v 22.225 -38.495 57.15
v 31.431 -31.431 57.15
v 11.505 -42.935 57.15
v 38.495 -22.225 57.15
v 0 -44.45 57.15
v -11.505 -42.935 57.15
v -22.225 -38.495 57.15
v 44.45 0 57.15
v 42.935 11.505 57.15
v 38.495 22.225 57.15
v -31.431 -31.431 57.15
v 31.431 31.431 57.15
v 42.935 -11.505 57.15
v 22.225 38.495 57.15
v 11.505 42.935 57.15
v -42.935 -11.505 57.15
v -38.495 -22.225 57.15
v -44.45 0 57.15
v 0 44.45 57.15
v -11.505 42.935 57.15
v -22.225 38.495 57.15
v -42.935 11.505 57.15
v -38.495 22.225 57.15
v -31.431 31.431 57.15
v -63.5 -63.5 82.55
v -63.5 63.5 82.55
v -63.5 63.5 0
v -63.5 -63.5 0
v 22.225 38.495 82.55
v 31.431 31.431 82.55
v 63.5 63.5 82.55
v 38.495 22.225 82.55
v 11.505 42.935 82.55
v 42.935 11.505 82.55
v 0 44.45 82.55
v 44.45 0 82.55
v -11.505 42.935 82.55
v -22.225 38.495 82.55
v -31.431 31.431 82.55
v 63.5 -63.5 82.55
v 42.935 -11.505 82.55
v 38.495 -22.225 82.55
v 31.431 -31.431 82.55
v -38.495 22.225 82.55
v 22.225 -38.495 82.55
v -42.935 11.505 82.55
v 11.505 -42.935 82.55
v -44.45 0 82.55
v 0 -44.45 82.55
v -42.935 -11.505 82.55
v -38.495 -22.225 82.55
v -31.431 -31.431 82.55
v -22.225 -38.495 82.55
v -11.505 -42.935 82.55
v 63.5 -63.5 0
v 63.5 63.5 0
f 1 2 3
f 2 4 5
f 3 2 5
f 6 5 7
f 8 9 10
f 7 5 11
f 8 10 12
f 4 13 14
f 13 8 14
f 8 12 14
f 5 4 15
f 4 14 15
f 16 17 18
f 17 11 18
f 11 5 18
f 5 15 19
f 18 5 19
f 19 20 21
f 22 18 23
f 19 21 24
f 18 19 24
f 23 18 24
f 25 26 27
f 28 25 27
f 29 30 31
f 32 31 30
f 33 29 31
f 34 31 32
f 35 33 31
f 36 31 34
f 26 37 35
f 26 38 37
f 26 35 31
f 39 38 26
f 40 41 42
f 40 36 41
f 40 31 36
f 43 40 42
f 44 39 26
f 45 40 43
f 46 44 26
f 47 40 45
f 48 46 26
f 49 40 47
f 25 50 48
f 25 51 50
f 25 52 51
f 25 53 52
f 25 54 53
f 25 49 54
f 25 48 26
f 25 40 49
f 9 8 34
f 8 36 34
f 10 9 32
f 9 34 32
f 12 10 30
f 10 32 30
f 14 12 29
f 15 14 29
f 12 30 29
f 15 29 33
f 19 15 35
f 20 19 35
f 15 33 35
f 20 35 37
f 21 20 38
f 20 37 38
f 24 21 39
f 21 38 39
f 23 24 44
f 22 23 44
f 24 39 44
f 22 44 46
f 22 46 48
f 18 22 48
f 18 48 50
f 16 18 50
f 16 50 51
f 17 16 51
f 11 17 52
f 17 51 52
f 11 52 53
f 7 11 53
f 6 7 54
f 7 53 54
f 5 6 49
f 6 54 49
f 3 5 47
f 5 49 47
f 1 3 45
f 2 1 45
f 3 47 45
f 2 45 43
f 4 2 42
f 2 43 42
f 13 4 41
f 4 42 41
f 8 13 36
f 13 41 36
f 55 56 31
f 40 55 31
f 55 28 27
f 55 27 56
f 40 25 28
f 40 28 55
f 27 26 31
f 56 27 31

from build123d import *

# Parameters (mm, degrees)
F0_W     = 44.45
F0_H     = 25.4
F1_DEPTH = 63.5


with BuildPart() as f1:
    # F0 (on Front) → F1 (new body, symmetric)
    with BuildSketch(Plane.XZ):
        Polygon((0, 82.55), (-63.5, 82.55), (-63.5, 0), (63.5, 0), (63.5, 82.55), (44.45, 82.55), (44.45, 57.15), (0, 57.15), align=None)
        with Locations((22.225, 69.85)):
            Rectangle(F0_W, F0_H)
    extrude(amount=F1_DEPTH, both=True)

    # F0 (on Front) → F2 (revolve, cut)
    with BuildSketch(Plane.XZ):
        with Locations((22.225, 69.85)):
            Rectangle(F0_W, F0_H)
    revolve(axis=Axis((0, 0, 41.275), (0, 0, 1)), mode=Mode.SUBTRACT)


solid = f1.part
